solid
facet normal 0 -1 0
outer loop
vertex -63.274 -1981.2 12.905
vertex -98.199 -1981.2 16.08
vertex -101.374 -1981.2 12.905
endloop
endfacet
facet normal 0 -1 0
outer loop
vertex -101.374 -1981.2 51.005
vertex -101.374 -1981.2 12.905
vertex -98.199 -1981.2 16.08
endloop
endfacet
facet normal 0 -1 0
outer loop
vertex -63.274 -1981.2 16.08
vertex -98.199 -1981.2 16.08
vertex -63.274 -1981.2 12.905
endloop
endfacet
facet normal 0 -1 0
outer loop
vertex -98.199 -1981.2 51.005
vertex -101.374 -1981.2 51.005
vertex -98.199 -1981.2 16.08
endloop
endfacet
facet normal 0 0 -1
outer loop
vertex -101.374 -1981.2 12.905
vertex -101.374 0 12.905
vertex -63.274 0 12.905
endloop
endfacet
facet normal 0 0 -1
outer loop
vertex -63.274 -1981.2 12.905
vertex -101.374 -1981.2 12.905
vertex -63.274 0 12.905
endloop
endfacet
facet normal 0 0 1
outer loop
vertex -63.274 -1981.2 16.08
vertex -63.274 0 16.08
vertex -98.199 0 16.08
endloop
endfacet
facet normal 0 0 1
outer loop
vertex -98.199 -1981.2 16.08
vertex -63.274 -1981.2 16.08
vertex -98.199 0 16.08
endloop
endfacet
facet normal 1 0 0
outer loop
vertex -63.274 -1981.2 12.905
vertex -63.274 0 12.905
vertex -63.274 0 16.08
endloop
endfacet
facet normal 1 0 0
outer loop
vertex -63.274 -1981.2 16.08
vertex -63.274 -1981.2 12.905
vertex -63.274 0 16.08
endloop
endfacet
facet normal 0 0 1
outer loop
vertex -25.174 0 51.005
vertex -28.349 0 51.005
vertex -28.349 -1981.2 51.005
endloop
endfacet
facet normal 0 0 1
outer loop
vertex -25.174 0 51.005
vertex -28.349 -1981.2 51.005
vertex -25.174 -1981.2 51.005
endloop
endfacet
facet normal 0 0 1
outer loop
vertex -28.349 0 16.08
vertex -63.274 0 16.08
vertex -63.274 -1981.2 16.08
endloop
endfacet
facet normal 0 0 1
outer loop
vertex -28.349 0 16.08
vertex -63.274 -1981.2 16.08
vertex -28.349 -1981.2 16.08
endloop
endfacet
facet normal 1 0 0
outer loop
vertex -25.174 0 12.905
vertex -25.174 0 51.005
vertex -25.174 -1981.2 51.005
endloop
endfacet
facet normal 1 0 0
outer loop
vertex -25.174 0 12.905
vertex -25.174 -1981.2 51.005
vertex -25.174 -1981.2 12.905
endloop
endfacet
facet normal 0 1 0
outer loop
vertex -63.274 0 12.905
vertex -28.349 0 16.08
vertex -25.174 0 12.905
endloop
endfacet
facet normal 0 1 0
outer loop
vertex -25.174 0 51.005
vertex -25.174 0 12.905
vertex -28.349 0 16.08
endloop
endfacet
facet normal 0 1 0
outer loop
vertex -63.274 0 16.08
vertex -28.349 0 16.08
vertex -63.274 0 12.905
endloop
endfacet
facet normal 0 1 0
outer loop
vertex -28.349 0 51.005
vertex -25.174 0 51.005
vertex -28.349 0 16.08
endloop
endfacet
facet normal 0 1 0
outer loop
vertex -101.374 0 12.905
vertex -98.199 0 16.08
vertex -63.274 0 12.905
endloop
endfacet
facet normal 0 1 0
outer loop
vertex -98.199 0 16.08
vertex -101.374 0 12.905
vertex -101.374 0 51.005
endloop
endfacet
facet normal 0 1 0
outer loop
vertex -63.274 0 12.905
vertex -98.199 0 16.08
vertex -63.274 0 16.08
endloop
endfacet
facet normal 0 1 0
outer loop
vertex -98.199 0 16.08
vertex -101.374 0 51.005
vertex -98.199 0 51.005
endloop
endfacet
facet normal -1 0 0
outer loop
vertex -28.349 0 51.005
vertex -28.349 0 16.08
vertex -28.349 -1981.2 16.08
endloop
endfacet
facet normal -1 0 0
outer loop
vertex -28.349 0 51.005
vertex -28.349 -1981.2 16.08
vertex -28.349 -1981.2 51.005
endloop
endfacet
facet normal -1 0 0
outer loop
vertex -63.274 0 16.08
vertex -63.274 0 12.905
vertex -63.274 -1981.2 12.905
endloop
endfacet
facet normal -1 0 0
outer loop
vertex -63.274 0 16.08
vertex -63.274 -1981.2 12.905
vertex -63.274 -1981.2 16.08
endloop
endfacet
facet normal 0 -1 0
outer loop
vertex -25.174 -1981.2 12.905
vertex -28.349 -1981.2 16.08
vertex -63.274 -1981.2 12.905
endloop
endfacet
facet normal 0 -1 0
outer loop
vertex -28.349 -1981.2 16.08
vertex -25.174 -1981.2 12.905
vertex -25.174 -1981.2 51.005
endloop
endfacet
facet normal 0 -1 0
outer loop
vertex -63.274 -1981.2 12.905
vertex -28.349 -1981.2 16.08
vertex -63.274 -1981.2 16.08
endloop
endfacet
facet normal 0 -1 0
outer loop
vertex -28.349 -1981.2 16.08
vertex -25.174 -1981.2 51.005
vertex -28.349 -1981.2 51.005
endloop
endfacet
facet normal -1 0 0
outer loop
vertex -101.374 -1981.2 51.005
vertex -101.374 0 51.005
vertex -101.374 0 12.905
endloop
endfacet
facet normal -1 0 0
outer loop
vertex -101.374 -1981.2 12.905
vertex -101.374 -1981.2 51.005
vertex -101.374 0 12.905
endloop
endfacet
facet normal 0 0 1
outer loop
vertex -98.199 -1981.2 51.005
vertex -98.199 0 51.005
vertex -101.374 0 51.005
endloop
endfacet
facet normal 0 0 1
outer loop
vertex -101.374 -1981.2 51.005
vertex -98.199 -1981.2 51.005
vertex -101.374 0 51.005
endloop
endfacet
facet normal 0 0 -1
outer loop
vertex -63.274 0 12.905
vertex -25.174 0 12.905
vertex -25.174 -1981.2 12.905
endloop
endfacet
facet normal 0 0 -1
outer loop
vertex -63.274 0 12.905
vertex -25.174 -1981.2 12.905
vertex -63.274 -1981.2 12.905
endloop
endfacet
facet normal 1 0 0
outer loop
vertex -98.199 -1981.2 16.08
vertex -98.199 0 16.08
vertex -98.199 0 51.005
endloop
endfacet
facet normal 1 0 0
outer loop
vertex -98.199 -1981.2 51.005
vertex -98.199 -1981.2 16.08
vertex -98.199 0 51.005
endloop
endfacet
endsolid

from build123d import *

# Parameters (mm, degrees)
F1_DEPTH = 1981.2


with BuildPart() as f1:
    # F0 (on Front) → F1 (new body)
    with BuildSketch(Plane.XZ):
        Polygon((-98.198516, 51.005271), (-101.373516, 51.005271), (-101.373516, 12.905271), (-63.273516, 12.905271), (-63.273516, 16.080271), (-98.198516, 16.080271), align=None)
    extrude(amount=F1_DEPTH)


with BuildPart() as f2_1:
    # F2: instance of F1
    add(f1.part.mirror(Plane(origin=(-63.273516, -990.6, 14.492771), x_dir=(0, 1, 0), z_dir=(1, 0, 0))))


solid = Compound([f1.part, f2_1.part])
